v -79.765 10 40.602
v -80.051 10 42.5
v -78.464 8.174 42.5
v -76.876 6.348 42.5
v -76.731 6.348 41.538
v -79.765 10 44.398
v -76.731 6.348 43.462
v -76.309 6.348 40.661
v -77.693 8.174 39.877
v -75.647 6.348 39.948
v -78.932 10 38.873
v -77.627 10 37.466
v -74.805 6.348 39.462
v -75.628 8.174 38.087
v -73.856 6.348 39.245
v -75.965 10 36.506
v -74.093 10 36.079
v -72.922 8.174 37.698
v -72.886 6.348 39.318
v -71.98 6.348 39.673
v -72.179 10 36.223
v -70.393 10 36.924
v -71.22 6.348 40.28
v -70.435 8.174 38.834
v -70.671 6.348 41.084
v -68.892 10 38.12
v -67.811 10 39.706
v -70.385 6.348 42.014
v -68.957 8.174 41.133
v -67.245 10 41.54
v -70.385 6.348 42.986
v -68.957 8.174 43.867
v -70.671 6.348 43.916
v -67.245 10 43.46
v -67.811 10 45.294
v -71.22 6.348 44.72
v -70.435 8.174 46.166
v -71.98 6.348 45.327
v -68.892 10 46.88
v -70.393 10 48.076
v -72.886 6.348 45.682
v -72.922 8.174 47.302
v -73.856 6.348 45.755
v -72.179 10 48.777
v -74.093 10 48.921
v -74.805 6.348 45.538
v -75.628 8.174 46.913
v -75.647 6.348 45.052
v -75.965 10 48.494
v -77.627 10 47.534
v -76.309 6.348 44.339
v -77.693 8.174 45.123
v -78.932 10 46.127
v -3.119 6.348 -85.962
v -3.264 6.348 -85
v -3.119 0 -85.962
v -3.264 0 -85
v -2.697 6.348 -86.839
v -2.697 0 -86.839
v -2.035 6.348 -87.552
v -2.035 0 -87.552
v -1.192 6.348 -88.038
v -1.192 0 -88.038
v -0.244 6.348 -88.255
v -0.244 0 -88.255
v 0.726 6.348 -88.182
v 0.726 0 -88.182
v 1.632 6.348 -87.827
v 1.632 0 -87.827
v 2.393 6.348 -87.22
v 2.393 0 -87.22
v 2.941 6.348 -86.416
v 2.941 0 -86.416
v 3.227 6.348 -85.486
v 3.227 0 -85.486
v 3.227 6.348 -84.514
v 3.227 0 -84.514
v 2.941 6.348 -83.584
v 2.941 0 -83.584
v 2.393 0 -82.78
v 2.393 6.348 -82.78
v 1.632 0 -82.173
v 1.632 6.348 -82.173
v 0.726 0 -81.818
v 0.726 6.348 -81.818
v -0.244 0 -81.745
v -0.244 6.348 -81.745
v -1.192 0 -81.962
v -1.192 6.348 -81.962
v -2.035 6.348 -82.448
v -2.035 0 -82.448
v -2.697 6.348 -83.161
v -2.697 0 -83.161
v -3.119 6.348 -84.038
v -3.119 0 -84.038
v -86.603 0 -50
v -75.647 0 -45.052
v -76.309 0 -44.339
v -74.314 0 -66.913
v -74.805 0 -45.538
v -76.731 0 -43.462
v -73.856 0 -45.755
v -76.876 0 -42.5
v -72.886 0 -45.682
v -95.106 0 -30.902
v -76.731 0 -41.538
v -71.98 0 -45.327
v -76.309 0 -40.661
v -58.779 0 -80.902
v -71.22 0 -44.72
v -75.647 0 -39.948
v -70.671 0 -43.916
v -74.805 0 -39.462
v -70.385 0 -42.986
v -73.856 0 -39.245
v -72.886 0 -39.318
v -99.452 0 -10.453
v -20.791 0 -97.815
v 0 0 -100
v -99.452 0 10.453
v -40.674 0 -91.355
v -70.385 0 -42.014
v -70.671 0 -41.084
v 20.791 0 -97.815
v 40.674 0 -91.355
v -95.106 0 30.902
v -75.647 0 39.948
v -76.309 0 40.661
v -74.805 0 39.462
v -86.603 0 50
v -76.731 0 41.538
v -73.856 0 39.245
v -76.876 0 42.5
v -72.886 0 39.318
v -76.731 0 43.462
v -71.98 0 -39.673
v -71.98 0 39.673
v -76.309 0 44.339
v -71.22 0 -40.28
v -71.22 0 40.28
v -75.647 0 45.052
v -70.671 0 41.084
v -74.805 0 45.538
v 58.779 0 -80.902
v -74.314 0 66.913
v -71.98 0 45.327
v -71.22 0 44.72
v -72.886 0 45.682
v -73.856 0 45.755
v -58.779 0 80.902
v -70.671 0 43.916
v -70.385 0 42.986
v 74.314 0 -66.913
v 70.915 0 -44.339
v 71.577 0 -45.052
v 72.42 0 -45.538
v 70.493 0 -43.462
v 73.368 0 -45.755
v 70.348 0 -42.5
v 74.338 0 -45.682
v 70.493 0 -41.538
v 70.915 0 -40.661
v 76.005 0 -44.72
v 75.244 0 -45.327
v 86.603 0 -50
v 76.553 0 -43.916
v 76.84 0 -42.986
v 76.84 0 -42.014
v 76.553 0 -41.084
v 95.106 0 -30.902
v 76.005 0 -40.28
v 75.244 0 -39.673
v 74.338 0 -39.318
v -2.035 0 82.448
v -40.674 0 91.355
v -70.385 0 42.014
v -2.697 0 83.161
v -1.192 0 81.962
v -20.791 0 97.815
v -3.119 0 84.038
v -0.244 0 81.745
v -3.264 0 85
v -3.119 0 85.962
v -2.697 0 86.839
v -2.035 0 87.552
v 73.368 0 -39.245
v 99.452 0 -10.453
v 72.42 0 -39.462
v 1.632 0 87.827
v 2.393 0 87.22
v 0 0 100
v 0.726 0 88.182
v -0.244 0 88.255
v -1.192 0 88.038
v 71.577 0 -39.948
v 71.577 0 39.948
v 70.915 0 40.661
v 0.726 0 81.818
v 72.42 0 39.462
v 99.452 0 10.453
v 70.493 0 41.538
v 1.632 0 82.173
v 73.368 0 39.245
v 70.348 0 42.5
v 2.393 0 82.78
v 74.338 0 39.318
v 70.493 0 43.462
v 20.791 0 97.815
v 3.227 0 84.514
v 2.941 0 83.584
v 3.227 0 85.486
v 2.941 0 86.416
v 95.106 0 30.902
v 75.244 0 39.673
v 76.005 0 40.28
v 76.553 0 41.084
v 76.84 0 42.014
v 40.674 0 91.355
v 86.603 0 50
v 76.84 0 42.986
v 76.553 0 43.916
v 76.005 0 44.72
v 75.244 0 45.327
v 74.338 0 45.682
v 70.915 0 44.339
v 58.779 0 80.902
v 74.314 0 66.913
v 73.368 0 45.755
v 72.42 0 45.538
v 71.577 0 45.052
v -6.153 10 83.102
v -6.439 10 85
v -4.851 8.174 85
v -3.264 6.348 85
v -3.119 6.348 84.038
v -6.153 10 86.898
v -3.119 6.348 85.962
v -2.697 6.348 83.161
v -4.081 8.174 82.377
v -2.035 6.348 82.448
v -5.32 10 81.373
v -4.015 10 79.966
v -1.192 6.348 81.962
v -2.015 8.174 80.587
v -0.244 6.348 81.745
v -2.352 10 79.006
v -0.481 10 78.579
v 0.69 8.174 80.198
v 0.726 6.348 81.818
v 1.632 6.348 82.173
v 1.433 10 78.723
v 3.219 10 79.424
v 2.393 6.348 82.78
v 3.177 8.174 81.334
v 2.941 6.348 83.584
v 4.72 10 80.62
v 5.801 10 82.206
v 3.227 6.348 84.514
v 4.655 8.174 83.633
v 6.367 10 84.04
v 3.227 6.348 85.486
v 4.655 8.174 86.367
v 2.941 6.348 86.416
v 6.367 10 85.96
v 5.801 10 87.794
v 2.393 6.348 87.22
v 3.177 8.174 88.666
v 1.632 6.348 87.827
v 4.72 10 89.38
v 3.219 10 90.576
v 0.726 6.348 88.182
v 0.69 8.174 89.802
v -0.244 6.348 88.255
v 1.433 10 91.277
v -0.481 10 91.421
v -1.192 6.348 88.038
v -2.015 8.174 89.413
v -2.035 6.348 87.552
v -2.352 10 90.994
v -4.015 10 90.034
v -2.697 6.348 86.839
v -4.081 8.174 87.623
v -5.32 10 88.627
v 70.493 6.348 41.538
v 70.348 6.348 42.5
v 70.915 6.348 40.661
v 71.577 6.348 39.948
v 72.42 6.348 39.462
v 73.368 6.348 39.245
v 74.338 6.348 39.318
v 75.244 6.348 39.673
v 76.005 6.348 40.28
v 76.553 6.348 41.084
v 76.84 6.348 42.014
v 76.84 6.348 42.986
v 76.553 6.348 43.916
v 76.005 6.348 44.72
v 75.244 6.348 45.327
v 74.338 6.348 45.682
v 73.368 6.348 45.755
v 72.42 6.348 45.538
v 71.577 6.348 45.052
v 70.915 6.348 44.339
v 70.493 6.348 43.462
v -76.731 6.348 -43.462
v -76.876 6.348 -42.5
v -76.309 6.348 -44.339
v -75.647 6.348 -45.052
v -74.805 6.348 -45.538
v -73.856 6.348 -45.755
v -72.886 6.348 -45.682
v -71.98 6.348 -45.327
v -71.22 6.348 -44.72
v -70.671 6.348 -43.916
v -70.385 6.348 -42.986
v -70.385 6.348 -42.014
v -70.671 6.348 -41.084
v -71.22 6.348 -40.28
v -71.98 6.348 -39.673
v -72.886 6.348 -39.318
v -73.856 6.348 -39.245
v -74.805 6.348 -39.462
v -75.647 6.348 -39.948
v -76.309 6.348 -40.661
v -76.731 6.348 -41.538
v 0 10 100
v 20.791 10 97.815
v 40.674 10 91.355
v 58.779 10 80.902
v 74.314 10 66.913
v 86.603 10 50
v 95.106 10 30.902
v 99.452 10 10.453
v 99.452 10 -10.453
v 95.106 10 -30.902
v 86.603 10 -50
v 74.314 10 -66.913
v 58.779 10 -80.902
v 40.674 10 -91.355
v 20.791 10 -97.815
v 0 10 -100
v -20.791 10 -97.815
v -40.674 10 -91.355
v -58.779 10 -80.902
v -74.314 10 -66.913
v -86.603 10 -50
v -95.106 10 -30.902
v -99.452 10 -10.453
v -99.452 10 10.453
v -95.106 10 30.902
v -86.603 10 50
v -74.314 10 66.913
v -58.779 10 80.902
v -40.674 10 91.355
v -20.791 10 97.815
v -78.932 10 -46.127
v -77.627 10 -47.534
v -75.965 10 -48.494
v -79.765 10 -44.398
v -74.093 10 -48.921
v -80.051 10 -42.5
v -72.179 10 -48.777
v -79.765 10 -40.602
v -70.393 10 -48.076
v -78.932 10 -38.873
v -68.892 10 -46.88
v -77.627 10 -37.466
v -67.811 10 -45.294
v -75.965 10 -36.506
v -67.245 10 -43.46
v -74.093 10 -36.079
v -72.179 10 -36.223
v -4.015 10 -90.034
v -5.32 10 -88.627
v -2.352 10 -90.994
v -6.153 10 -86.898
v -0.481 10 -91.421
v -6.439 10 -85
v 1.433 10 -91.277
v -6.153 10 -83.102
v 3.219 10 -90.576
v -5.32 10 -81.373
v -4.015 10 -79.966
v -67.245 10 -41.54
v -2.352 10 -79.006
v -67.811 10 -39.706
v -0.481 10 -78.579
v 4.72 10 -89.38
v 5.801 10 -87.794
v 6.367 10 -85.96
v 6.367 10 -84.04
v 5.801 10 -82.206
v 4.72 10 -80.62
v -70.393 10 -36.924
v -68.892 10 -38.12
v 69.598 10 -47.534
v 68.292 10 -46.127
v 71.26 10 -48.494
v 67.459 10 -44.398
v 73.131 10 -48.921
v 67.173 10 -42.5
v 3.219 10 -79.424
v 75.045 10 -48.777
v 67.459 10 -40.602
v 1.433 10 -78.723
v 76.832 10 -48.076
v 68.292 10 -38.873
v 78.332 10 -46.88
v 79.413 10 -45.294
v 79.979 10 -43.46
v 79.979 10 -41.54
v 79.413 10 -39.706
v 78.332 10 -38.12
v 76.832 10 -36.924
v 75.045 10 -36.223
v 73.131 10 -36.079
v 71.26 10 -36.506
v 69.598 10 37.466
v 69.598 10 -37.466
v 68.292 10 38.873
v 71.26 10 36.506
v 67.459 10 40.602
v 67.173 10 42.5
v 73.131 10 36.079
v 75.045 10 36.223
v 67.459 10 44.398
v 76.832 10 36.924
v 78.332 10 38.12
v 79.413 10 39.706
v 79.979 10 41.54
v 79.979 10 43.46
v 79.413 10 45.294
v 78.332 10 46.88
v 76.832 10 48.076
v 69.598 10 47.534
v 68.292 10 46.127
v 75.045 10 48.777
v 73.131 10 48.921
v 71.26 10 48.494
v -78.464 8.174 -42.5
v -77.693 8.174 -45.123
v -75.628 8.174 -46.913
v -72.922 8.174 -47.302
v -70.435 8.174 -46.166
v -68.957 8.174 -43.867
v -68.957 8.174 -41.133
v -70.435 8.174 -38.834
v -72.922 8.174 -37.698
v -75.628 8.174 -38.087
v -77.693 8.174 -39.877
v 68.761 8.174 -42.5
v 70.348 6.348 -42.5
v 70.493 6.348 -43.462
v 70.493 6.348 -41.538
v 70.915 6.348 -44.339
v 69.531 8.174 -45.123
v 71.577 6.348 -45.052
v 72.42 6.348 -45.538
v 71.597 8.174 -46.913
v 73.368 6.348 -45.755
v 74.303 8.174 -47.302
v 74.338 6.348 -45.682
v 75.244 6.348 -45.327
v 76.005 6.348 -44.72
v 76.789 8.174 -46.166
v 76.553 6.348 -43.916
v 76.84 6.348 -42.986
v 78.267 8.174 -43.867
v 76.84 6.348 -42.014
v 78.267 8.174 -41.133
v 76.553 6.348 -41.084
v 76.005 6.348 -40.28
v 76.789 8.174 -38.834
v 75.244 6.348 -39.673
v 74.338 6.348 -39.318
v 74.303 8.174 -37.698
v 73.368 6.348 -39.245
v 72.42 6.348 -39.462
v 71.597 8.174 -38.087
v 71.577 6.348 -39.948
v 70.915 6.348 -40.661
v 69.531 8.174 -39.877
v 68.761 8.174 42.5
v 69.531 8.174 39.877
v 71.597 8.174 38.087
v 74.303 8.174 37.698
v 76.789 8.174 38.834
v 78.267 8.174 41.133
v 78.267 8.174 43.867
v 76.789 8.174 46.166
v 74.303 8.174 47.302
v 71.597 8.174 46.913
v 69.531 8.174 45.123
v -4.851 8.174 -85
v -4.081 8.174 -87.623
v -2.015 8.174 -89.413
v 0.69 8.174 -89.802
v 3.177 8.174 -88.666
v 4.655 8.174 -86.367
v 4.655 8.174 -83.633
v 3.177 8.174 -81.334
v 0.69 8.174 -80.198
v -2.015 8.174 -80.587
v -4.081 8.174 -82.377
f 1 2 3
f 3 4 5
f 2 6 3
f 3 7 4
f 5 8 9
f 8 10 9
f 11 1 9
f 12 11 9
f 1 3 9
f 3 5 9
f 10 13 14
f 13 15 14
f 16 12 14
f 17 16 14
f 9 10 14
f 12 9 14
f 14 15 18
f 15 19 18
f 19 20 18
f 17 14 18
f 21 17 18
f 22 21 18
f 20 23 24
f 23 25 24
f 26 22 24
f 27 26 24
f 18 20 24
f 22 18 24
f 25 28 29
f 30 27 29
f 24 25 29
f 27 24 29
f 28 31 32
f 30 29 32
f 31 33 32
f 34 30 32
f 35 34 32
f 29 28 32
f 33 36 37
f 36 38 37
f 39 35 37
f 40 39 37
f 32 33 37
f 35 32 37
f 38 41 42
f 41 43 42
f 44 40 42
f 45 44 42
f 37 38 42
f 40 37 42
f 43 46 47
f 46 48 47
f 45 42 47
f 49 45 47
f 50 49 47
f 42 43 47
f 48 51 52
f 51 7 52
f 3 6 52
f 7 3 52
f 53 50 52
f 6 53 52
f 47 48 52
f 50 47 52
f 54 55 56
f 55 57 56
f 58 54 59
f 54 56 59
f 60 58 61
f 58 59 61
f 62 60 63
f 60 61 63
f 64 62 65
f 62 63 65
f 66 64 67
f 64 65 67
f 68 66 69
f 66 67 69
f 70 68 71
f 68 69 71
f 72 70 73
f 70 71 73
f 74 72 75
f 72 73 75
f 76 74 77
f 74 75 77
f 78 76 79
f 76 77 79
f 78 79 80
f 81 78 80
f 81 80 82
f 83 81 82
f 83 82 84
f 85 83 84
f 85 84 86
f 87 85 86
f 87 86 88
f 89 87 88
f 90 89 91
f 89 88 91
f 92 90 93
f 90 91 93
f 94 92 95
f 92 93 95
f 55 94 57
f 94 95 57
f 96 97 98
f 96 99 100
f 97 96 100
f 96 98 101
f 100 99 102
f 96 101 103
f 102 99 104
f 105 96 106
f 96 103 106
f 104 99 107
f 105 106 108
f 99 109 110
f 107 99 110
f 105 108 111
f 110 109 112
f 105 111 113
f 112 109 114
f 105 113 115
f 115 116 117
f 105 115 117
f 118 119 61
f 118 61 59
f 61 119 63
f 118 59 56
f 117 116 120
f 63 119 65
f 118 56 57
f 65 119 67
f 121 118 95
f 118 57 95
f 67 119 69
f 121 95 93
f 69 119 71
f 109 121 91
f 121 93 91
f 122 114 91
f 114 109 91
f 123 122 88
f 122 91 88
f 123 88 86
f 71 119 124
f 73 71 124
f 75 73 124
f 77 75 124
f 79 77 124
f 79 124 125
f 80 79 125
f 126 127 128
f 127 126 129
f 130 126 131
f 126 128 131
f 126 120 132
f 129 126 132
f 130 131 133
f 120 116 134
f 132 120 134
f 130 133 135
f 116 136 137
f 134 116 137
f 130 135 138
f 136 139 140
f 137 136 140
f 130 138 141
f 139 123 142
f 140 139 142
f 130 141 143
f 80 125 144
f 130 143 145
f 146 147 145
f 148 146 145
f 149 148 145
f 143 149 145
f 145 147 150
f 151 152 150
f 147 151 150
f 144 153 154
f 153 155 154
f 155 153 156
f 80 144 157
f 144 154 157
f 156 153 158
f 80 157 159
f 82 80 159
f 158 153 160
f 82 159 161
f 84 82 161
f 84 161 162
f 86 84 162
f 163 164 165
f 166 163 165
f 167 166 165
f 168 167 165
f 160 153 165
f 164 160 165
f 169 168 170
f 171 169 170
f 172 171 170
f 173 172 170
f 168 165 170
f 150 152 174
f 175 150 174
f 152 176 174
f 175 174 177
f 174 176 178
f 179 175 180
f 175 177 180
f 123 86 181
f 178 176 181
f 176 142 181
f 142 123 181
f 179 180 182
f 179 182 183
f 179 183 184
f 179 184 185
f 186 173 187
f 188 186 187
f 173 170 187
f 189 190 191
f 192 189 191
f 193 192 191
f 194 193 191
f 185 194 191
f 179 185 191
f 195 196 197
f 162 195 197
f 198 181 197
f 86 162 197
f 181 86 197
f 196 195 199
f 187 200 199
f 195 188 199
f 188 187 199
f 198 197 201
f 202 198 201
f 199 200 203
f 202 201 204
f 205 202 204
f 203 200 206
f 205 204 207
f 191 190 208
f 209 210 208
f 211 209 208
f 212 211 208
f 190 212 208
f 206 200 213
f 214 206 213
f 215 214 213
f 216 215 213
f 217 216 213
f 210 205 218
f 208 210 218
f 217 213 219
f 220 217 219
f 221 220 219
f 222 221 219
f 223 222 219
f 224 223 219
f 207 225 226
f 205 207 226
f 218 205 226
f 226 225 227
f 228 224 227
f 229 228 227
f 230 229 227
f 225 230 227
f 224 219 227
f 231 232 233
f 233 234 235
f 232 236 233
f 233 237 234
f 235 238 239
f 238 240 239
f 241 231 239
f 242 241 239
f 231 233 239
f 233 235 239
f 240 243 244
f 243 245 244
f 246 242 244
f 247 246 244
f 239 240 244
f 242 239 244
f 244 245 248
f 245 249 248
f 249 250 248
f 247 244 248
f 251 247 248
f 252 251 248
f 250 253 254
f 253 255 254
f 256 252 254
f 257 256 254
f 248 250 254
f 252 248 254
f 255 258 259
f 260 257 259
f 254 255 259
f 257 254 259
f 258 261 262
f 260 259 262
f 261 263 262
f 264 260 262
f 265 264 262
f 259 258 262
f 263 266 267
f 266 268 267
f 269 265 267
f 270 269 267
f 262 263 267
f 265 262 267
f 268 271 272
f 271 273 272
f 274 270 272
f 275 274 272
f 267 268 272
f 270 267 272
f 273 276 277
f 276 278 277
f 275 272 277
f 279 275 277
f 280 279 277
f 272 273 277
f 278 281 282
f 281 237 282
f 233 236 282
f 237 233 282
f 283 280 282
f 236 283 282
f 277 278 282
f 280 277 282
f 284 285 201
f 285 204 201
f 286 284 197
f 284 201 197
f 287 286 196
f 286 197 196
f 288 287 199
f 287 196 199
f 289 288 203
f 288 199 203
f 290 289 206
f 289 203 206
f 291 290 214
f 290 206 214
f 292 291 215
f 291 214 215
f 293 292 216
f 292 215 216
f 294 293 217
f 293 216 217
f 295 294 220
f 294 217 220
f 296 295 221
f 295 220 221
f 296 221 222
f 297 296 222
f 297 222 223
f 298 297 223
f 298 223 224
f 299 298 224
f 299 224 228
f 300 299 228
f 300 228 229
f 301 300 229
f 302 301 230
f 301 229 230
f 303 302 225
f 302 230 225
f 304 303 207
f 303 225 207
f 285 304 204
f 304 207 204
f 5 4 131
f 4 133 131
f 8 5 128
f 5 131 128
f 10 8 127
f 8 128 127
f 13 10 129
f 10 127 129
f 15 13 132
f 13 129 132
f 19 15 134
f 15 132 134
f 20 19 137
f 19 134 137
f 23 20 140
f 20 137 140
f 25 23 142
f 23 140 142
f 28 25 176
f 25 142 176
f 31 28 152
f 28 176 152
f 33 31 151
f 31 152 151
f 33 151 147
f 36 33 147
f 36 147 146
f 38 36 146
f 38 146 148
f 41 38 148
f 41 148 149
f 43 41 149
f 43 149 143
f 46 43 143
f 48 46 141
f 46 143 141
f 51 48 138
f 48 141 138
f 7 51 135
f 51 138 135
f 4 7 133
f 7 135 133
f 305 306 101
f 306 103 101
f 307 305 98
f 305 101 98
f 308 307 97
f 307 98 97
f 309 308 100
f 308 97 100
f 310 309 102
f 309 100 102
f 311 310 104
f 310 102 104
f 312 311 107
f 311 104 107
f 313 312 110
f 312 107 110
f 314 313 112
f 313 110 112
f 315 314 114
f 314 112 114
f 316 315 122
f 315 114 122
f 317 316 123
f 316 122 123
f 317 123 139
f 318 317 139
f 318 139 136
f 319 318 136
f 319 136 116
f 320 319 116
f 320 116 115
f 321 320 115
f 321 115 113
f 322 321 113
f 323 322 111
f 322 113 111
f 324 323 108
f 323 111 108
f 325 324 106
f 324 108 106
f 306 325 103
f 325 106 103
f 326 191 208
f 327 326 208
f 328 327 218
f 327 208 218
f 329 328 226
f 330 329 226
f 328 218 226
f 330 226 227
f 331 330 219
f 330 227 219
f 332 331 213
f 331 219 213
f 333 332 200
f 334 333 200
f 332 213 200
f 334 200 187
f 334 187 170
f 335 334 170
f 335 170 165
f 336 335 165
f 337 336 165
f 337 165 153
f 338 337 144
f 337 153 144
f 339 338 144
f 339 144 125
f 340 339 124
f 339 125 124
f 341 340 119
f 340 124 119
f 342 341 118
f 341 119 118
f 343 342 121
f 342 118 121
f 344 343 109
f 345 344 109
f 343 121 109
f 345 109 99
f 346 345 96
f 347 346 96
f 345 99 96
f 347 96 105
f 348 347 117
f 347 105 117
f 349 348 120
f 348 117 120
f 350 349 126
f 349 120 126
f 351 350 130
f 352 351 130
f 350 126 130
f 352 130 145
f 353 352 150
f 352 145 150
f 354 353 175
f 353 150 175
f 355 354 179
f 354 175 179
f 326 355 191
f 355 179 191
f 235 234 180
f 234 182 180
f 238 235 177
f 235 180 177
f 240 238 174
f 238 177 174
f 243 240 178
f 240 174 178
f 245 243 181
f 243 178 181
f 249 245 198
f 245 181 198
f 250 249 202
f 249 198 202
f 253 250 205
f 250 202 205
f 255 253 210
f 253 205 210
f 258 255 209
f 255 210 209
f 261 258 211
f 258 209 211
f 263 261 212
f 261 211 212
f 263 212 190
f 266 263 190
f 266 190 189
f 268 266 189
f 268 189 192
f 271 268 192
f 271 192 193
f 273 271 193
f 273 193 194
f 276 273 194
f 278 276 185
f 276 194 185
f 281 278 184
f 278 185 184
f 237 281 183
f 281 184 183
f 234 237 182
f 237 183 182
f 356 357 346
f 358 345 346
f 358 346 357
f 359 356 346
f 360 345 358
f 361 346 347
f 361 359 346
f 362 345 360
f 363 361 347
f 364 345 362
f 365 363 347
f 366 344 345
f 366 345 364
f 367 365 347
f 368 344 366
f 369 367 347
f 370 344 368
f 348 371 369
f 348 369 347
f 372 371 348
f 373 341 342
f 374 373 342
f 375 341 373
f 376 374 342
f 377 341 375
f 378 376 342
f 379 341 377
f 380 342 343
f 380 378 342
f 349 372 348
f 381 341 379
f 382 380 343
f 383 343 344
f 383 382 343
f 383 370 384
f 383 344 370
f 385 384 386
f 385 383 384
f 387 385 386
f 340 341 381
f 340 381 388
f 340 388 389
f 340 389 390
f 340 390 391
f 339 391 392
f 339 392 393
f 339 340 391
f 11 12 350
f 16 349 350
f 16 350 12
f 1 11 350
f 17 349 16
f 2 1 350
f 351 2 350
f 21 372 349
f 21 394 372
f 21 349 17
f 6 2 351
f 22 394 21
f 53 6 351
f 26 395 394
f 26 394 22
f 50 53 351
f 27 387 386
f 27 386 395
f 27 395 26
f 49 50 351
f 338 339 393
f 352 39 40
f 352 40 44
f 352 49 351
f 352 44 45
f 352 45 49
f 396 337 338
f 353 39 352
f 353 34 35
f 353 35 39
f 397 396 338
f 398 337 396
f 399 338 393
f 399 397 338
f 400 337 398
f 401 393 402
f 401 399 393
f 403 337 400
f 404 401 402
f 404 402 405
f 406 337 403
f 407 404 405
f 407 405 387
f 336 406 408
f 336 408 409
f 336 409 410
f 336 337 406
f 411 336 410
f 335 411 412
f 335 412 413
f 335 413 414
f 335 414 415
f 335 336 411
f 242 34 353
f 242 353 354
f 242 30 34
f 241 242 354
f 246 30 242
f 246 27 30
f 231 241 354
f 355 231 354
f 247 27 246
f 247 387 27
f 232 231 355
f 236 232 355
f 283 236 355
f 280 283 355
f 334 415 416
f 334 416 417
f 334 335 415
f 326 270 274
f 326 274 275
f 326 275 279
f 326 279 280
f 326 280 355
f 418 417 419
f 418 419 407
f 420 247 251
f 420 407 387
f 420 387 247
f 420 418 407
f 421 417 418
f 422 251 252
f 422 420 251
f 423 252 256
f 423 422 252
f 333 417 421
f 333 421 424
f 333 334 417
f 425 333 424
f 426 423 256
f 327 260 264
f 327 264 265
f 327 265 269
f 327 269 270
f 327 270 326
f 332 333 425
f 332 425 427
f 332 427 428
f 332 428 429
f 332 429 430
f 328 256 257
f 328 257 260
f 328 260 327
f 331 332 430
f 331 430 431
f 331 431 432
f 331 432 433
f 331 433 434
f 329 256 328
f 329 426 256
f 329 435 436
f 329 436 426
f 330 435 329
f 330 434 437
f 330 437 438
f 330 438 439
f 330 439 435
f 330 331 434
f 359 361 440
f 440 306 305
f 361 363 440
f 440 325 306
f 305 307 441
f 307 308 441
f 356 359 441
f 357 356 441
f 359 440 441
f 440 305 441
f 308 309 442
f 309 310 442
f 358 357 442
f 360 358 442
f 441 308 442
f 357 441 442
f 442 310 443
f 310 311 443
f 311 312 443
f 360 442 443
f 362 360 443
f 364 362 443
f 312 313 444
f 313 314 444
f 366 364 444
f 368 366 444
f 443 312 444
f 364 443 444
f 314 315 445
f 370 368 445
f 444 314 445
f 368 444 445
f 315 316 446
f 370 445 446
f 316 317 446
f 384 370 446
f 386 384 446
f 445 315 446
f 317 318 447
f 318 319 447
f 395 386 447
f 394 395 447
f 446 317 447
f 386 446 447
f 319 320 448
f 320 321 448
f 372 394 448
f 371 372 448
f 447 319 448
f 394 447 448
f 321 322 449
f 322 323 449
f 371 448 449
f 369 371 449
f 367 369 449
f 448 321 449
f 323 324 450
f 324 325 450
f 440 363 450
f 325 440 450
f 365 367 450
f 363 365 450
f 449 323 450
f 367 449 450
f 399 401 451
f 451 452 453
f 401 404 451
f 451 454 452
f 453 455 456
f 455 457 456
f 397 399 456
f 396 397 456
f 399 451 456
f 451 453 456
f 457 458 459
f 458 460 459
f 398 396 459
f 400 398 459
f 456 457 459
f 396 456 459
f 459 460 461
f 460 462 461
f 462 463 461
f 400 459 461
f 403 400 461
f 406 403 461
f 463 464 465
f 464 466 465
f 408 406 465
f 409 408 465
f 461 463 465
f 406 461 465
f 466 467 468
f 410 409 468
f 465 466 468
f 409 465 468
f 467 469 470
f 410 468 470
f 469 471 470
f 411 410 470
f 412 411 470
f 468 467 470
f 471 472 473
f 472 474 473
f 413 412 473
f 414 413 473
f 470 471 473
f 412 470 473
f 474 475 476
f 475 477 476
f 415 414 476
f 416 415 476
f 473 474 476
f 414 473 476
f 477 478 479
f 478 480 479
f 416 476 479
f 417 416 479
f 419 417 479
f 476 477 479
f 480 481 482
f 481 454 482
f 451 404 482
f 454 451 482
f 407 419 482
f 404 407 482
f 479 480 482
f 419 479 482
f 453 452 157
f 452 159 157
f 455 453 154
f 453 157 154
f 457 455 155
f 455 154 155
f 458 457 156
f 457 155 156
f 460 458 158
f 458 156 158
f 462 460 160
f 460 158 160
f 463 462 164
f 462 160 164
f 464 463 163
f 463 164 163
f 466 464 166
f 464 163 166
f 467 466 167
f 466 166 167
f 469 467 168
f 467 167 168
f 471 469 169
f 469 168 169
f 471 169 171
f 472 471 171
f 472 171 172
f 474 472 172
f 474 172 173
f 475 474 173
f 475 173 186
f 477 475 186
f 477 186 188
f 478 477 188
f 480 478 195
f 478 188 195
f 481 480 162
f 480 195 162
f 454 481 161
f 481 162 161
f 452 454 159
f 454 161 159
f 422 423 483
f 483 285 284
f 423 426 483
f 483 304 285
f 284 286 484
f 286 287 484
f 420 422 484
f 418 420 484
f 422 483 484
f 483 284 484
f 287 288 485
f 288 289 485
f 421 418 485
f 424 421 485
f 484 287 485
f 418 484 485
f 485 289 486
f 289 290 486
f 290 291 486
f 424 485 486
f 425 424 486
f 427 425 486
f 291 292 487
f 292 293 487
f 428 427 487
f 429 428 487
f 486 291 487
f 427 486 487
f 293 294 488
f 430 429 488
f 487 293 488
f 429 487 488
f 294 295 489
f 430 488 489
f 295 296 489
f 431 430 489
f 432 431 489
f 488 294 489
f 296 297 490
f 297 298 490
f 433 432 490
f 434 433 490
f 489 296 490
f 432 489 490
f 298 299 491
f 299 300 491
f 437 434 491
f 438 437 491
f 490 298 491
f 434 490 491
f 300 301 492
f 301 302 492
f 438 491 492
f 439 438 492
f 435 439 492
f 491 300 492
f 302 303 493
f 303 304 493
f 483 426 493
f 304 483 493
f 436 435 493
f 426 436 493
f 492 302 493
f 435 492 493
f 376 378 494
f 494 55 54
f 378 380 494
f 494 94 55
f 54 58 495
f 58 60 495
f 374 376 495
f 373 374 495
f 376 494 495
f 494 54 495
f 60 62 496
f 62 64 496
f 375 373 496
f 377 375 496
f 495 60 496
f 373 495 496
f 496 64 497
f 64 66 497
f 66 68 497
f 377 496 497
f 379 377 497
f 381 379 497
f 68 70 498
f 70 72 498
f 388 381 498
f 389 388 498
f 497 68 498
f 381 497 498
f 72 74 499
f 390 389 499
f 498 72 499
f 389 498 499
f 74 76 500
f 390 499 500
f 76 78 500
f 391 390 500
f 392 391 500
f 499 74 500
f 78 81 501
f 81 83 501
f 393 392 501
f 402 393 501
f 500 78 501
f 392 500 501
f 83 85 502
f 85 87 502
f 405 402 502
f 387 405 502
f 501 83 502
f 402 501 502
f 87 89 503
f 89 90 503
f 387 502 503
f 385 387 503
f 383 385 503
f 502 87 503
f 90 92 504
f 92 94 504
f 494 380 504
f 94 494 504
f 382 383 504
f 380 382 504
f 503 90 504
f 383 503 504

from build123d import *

# Parameters (mm, degrees)
SKETCH1_R                                        = 100
BOSS_EXTRUDE1_DEPTH                              = 10
CSK_FOR_1_4_FLAT_HEAD_MACHINE_SCREW1_D           = 6.5278
CSK_FOR_1_4_FLAT_HEAD_MACHINE_SCREW1_DEPTH       = 10
CSK_FOR_1_4_FLAT_HEAD_MACHINE_SCREW1_CSINK_D     = 12.8778
CSK_FOR_1_4_FLAT_HEAD_MACHINE_SCREW1_CSINK_ANGLE = 82
CSK_FOR_1_4_FLAT_HEAD_MACHINE_SCREW1_TIP         = 1.961148974


with BuildPart() as part:
    # Sketch1 → Boss-Extrude1 (new body)
    with BuildSketch(Plane(origin=(0, 0, 0), x_dir=(1, 0, 0), z_dir=(0, 1, 0))):
        with Locations(Location((0, 0, 0), (0, 0, 270))):
            Circle(SKETCH1_R)
    extrude(amount=BOSS_EXTRUDE1_DEPTH)

    # CSK for 1/4 Flat Head Machine Screw1
    with Locations(Plane(origin=(0, 10, 0), x_dir=(1, 0, 0), z_dir=(0, 1, 0))):
        with Locations((-73.612159322, 42.5), (0, 85), (73.612159322, 42.5), (73.612159322, -42.5), (0, -85), (-73.612159322, -42.5)):
            CounterSinkHole(CSK_FOR_1_4_FLAT_HEAD_MACHINE_SCREW1_D / 2, CSK_FOR_1_4_FLAT_HEAD_MACHINE_SCREW1_CSINK_D / 2, depth=CSK_FOR_1_4_FLAT_HEAD_MACHINE_SCREW1_DEPTH, counter_sink_angle=CSK_FOR_1_4_FLAT_HEAD_MACHINE_SCREW1_CSINK_ANGLE)
            with Locations((0, 0, -(CSK_FOR_1_4_FLAT_HEAD_MACHINE_SCREW1_DEPTH + CSK_FOR_1_4_FLAT_HEAD_MACHINE_SCREW1_TIP / 2))):  # 118° drill point
                Cone(0, CSK_FOR_1_4_FLAT_HEAD_MACHINE_SCREW1_D / 2, CSK_FOR_1_4_FLAT_HEAD_MACHINE_SCREW1_TIP, mode=Mode.SUBTRACT)


solid = part.part
